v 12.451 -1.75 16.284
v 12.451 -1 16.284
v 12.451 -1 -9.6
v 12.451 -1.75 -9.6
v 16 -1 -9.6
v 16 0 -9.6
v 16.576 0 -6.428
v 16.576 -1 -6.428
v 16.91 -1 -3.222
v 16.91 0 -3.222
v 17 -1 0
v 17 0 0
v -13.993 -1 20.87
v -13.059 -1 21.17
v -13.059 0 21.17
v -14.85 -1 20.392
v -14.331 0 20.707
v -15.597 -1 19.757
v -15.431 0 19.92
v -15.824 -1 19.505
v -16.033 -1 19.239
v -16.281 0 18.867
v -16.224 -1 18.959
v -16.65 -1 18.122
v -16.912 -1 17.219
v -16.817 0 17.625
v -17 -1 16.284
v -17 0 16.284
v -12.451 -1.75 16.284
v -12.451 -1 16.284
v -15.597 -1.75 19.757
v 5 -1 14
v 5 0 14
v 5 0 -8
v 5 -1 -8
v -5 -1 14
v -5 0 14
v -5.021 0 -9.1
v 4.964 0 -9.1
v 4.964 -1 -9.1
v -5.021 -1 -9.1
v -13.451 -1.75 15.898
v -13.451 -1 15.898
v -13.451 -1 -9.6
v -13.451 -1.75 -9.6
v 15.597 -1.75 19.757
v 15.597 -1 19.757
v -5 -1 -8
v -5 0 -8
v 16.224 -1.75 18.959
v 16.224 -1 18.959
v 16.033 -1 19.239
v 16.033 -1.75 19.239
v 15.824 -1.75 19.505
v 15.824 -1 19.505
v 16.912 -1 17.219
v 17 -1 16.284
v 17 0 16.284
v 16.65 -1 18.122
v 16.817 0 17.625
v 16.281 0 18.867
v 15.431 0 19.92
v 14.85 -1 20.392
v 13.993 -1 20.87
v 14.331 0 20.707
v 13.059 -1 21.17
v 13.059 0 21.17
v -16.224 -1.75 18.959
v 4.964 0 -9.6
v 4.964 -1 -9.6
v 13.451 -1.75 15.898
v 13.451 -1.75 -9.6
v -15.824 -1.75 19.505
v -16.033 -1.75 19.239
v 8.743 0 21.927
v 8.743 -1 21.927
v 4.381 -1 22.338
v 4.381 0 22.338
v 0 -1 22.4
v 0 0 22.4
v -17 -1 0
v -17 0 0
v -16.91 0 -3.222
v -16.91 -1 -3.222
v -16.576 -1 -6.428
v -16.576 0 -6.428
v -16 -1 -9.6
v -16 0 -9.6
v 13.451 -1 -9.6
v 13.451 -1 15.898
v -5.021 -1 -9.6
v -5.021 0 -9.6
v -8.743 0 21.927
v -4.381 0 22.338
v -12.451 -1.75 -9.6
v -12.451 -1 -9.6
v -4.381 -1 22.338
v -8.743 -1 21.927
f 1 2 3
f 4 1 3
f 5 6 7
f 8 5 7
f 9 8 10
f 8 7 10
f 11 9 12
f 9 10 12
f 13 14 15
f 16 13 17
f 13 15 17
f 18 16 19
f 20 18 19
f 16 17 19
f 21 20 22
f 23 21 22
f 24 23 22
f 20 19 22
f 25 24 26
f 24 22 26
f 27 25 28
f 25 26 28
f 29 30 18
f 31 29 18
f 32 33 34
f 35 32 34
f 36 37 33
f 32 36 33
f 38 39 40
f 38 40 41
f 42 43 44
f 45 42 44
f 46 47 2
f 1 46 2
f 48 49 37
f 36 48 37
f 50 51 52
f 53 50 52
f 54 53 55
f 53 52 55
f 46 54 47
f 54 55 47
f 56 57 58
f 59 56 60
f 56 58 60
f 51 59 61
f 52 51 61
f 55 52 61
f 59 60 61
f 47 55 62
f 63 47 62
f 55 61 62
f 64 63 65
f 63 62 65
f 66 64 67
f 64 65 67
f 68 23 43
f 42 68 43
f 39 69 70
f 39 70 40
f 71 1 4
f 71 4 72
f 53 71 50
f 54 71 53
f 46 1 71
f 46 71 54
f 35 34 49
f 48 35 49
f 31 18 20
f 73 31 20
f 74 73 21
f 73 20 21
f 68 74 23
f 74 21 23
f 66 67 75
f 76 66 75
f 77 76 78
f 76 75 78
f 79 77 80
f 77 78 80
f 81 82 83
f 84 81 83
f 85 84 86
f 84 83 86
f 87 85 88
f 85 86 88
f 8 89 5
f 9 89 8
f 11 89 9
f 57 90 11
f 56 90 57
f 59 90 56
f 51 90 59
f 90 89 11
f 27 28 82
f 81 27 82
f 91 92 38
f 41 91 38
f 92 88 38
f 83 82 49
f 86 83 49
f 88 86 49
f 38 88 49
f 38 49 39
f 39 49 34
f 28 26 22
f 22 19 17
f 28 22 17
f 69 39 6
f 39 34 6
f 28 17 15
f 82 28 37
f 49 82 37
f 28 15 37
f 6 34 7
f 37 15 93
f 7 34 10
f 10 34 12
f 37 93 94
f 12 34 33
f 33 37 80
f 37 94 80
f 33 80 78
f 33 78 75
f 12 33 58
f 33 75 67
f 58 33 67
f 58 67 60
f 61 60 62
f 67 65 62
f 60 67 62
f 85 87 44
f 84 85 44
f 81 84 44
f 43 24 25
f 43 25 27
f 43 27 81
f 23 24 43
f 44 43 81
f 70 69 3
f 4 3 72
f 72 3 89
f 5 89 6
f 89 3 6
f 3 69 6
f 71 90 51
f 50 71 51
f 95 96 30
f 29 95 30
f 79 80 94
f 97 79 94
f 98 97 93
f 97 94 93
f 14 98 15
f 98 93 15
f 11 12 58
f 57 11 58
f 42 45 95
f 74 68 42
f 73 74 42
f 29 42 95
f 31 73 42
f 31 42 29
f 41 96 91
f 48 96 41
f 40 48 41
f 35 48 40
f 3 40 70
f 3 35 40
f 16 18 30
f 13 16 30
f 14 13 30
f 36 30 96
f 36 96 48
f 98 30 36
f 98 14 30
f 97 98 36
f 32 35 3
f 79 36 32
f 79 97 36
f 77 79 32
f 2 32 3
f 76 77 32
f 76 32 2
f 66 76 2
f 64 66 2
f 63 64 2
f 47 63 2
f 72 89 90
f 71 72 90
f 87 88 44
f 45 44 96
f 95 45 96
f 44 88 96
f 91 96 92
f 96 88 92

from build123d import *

# Parameters (mm, degrees)
F0_W     = 4.9639665522
F0_H     = 0.5
F0_W_2   = 5.0214207731
F1_DEPTH = 1
F2_DEPTH = 8.4
F4_DEPTH = 0.75


with BuildPart() as f1:
    # F0 (on Front) → F1 (new body)
    with BuildSketch(Plane.XZ):
        with BuildLine():
            Line((-5.0214207731, -9.1), (0, -9.1))
            Line((0, -9.1), (4.9639665522, -9.1))
            Line((4.9639665522, -9.1), (4.9639665522, -9.6))
            Line((4.9639665522, -9.6), (16, -9.6))
            ThreePointArc((16, -9.6), (16.7734096476, -4.8284801716), (17, 0))
            Line((17, 0), (17, 16.2837651256))
            ThreePointArc((17, 16.2837651256), (15.8919740301, 19.4226404256), (13.0589847405, 21.1703335861))
            ThreePointArc((13.0589847405, 21.1703335861), (6.5662809494, 22.1758593321), (0, 22.4))
            ThreePointArc((0, 22.4), (-6.5662809494, 22.1758593321), (-13.0589847405, 21.1703335861))
            ThreePointArc((-13.0589847405, 21.1703335861), (-15.8919740301, 19.4226404256), (-17, 16.2837651256))
            Line((-17, 16.2837651256), (-17, 0))
            ThreePointArc((-17, 0), (-16.7734096476, -4.8284801716), (-16, -9.6))
            Line((-16, -9.6), (-5.0214207731, -9.6))
            Line((-5.0214207731, -9.6), (-5.0214207731, -9.1))
        make_face()
        Polygon((5, -8), (0, -8), (-5, -8), (-5, 14), (5, 14), align=None, mode=Mode.SUBTRACT)
        with Locations((2.4819832761, -9.35)):
            Rectangle(F0_W, F0_H)
        with Locations((-2.5107103866, -9.35)):
            Rectangle(F0_W_2, F0_H)
    extrude(amount=F1_DEPTH)

    # F0 (on Front) → F2 (cut)
    with BuildSketch(Plane.XZ):
        with Locations((-2.5107103866, -9.35)):
            Rectangle(F0_W_2, F0_H)
        with Locations((2.4819832761, -9.35)):
            Rectangle(F0_W, F0_H)
    extrude(amount=F2_DEPTH, mode=Mode.SUBTRACT)

    # F3 (on face) → F4 (join)
    with BuildSketch(Plane.XZ.offset(1)):
        with BuildLine():
            Line((-13.4512646501, -9.6), (-12.4512640759, -9.6))
            Line((-12.4512640759, -9.6), (-12.4512640759, 16.2837651256))
            Line((-12.4512640759, 16.2837651256), (-15.5969633106, 19.7567832571))
            ThreePointArc((-15.5969633106, 19.7567832571), (-15.9307044856, 19.3740017261), (-16.223895747, 18.9593407121))
            Line((-16.223895747, 18.9593407121), (-13.4512646501, 15.8982095126))
            Line((-13.4512646501, 15.8982095126), (-13.4512646501, -9.6))
        make_face()
        with BuildLine():
            Line((12.4512640759, 16.2837651256), (12.4512640759, -9.6))
            Line((12.4512640759, -9.6), (13.4512646501, -9.6))
            Line((13.4512646501, -9.6), (13.4512646501, 15.8982095126))
            Line((13.4512646501, 15.8982095126), (16.223895747, 18.9593407121))
            ThreePointArc((16.223895747, 18.9593407121), (15.9307044856, 19.3740017261), (15.5969633106, 19.7567832571))
            Line((15.5969633106, 19.7567832571), (12.4512640759, 16.2837651256))
        make_face()
    extrude(amount=F4_DEPTH)


solid = f1.part
